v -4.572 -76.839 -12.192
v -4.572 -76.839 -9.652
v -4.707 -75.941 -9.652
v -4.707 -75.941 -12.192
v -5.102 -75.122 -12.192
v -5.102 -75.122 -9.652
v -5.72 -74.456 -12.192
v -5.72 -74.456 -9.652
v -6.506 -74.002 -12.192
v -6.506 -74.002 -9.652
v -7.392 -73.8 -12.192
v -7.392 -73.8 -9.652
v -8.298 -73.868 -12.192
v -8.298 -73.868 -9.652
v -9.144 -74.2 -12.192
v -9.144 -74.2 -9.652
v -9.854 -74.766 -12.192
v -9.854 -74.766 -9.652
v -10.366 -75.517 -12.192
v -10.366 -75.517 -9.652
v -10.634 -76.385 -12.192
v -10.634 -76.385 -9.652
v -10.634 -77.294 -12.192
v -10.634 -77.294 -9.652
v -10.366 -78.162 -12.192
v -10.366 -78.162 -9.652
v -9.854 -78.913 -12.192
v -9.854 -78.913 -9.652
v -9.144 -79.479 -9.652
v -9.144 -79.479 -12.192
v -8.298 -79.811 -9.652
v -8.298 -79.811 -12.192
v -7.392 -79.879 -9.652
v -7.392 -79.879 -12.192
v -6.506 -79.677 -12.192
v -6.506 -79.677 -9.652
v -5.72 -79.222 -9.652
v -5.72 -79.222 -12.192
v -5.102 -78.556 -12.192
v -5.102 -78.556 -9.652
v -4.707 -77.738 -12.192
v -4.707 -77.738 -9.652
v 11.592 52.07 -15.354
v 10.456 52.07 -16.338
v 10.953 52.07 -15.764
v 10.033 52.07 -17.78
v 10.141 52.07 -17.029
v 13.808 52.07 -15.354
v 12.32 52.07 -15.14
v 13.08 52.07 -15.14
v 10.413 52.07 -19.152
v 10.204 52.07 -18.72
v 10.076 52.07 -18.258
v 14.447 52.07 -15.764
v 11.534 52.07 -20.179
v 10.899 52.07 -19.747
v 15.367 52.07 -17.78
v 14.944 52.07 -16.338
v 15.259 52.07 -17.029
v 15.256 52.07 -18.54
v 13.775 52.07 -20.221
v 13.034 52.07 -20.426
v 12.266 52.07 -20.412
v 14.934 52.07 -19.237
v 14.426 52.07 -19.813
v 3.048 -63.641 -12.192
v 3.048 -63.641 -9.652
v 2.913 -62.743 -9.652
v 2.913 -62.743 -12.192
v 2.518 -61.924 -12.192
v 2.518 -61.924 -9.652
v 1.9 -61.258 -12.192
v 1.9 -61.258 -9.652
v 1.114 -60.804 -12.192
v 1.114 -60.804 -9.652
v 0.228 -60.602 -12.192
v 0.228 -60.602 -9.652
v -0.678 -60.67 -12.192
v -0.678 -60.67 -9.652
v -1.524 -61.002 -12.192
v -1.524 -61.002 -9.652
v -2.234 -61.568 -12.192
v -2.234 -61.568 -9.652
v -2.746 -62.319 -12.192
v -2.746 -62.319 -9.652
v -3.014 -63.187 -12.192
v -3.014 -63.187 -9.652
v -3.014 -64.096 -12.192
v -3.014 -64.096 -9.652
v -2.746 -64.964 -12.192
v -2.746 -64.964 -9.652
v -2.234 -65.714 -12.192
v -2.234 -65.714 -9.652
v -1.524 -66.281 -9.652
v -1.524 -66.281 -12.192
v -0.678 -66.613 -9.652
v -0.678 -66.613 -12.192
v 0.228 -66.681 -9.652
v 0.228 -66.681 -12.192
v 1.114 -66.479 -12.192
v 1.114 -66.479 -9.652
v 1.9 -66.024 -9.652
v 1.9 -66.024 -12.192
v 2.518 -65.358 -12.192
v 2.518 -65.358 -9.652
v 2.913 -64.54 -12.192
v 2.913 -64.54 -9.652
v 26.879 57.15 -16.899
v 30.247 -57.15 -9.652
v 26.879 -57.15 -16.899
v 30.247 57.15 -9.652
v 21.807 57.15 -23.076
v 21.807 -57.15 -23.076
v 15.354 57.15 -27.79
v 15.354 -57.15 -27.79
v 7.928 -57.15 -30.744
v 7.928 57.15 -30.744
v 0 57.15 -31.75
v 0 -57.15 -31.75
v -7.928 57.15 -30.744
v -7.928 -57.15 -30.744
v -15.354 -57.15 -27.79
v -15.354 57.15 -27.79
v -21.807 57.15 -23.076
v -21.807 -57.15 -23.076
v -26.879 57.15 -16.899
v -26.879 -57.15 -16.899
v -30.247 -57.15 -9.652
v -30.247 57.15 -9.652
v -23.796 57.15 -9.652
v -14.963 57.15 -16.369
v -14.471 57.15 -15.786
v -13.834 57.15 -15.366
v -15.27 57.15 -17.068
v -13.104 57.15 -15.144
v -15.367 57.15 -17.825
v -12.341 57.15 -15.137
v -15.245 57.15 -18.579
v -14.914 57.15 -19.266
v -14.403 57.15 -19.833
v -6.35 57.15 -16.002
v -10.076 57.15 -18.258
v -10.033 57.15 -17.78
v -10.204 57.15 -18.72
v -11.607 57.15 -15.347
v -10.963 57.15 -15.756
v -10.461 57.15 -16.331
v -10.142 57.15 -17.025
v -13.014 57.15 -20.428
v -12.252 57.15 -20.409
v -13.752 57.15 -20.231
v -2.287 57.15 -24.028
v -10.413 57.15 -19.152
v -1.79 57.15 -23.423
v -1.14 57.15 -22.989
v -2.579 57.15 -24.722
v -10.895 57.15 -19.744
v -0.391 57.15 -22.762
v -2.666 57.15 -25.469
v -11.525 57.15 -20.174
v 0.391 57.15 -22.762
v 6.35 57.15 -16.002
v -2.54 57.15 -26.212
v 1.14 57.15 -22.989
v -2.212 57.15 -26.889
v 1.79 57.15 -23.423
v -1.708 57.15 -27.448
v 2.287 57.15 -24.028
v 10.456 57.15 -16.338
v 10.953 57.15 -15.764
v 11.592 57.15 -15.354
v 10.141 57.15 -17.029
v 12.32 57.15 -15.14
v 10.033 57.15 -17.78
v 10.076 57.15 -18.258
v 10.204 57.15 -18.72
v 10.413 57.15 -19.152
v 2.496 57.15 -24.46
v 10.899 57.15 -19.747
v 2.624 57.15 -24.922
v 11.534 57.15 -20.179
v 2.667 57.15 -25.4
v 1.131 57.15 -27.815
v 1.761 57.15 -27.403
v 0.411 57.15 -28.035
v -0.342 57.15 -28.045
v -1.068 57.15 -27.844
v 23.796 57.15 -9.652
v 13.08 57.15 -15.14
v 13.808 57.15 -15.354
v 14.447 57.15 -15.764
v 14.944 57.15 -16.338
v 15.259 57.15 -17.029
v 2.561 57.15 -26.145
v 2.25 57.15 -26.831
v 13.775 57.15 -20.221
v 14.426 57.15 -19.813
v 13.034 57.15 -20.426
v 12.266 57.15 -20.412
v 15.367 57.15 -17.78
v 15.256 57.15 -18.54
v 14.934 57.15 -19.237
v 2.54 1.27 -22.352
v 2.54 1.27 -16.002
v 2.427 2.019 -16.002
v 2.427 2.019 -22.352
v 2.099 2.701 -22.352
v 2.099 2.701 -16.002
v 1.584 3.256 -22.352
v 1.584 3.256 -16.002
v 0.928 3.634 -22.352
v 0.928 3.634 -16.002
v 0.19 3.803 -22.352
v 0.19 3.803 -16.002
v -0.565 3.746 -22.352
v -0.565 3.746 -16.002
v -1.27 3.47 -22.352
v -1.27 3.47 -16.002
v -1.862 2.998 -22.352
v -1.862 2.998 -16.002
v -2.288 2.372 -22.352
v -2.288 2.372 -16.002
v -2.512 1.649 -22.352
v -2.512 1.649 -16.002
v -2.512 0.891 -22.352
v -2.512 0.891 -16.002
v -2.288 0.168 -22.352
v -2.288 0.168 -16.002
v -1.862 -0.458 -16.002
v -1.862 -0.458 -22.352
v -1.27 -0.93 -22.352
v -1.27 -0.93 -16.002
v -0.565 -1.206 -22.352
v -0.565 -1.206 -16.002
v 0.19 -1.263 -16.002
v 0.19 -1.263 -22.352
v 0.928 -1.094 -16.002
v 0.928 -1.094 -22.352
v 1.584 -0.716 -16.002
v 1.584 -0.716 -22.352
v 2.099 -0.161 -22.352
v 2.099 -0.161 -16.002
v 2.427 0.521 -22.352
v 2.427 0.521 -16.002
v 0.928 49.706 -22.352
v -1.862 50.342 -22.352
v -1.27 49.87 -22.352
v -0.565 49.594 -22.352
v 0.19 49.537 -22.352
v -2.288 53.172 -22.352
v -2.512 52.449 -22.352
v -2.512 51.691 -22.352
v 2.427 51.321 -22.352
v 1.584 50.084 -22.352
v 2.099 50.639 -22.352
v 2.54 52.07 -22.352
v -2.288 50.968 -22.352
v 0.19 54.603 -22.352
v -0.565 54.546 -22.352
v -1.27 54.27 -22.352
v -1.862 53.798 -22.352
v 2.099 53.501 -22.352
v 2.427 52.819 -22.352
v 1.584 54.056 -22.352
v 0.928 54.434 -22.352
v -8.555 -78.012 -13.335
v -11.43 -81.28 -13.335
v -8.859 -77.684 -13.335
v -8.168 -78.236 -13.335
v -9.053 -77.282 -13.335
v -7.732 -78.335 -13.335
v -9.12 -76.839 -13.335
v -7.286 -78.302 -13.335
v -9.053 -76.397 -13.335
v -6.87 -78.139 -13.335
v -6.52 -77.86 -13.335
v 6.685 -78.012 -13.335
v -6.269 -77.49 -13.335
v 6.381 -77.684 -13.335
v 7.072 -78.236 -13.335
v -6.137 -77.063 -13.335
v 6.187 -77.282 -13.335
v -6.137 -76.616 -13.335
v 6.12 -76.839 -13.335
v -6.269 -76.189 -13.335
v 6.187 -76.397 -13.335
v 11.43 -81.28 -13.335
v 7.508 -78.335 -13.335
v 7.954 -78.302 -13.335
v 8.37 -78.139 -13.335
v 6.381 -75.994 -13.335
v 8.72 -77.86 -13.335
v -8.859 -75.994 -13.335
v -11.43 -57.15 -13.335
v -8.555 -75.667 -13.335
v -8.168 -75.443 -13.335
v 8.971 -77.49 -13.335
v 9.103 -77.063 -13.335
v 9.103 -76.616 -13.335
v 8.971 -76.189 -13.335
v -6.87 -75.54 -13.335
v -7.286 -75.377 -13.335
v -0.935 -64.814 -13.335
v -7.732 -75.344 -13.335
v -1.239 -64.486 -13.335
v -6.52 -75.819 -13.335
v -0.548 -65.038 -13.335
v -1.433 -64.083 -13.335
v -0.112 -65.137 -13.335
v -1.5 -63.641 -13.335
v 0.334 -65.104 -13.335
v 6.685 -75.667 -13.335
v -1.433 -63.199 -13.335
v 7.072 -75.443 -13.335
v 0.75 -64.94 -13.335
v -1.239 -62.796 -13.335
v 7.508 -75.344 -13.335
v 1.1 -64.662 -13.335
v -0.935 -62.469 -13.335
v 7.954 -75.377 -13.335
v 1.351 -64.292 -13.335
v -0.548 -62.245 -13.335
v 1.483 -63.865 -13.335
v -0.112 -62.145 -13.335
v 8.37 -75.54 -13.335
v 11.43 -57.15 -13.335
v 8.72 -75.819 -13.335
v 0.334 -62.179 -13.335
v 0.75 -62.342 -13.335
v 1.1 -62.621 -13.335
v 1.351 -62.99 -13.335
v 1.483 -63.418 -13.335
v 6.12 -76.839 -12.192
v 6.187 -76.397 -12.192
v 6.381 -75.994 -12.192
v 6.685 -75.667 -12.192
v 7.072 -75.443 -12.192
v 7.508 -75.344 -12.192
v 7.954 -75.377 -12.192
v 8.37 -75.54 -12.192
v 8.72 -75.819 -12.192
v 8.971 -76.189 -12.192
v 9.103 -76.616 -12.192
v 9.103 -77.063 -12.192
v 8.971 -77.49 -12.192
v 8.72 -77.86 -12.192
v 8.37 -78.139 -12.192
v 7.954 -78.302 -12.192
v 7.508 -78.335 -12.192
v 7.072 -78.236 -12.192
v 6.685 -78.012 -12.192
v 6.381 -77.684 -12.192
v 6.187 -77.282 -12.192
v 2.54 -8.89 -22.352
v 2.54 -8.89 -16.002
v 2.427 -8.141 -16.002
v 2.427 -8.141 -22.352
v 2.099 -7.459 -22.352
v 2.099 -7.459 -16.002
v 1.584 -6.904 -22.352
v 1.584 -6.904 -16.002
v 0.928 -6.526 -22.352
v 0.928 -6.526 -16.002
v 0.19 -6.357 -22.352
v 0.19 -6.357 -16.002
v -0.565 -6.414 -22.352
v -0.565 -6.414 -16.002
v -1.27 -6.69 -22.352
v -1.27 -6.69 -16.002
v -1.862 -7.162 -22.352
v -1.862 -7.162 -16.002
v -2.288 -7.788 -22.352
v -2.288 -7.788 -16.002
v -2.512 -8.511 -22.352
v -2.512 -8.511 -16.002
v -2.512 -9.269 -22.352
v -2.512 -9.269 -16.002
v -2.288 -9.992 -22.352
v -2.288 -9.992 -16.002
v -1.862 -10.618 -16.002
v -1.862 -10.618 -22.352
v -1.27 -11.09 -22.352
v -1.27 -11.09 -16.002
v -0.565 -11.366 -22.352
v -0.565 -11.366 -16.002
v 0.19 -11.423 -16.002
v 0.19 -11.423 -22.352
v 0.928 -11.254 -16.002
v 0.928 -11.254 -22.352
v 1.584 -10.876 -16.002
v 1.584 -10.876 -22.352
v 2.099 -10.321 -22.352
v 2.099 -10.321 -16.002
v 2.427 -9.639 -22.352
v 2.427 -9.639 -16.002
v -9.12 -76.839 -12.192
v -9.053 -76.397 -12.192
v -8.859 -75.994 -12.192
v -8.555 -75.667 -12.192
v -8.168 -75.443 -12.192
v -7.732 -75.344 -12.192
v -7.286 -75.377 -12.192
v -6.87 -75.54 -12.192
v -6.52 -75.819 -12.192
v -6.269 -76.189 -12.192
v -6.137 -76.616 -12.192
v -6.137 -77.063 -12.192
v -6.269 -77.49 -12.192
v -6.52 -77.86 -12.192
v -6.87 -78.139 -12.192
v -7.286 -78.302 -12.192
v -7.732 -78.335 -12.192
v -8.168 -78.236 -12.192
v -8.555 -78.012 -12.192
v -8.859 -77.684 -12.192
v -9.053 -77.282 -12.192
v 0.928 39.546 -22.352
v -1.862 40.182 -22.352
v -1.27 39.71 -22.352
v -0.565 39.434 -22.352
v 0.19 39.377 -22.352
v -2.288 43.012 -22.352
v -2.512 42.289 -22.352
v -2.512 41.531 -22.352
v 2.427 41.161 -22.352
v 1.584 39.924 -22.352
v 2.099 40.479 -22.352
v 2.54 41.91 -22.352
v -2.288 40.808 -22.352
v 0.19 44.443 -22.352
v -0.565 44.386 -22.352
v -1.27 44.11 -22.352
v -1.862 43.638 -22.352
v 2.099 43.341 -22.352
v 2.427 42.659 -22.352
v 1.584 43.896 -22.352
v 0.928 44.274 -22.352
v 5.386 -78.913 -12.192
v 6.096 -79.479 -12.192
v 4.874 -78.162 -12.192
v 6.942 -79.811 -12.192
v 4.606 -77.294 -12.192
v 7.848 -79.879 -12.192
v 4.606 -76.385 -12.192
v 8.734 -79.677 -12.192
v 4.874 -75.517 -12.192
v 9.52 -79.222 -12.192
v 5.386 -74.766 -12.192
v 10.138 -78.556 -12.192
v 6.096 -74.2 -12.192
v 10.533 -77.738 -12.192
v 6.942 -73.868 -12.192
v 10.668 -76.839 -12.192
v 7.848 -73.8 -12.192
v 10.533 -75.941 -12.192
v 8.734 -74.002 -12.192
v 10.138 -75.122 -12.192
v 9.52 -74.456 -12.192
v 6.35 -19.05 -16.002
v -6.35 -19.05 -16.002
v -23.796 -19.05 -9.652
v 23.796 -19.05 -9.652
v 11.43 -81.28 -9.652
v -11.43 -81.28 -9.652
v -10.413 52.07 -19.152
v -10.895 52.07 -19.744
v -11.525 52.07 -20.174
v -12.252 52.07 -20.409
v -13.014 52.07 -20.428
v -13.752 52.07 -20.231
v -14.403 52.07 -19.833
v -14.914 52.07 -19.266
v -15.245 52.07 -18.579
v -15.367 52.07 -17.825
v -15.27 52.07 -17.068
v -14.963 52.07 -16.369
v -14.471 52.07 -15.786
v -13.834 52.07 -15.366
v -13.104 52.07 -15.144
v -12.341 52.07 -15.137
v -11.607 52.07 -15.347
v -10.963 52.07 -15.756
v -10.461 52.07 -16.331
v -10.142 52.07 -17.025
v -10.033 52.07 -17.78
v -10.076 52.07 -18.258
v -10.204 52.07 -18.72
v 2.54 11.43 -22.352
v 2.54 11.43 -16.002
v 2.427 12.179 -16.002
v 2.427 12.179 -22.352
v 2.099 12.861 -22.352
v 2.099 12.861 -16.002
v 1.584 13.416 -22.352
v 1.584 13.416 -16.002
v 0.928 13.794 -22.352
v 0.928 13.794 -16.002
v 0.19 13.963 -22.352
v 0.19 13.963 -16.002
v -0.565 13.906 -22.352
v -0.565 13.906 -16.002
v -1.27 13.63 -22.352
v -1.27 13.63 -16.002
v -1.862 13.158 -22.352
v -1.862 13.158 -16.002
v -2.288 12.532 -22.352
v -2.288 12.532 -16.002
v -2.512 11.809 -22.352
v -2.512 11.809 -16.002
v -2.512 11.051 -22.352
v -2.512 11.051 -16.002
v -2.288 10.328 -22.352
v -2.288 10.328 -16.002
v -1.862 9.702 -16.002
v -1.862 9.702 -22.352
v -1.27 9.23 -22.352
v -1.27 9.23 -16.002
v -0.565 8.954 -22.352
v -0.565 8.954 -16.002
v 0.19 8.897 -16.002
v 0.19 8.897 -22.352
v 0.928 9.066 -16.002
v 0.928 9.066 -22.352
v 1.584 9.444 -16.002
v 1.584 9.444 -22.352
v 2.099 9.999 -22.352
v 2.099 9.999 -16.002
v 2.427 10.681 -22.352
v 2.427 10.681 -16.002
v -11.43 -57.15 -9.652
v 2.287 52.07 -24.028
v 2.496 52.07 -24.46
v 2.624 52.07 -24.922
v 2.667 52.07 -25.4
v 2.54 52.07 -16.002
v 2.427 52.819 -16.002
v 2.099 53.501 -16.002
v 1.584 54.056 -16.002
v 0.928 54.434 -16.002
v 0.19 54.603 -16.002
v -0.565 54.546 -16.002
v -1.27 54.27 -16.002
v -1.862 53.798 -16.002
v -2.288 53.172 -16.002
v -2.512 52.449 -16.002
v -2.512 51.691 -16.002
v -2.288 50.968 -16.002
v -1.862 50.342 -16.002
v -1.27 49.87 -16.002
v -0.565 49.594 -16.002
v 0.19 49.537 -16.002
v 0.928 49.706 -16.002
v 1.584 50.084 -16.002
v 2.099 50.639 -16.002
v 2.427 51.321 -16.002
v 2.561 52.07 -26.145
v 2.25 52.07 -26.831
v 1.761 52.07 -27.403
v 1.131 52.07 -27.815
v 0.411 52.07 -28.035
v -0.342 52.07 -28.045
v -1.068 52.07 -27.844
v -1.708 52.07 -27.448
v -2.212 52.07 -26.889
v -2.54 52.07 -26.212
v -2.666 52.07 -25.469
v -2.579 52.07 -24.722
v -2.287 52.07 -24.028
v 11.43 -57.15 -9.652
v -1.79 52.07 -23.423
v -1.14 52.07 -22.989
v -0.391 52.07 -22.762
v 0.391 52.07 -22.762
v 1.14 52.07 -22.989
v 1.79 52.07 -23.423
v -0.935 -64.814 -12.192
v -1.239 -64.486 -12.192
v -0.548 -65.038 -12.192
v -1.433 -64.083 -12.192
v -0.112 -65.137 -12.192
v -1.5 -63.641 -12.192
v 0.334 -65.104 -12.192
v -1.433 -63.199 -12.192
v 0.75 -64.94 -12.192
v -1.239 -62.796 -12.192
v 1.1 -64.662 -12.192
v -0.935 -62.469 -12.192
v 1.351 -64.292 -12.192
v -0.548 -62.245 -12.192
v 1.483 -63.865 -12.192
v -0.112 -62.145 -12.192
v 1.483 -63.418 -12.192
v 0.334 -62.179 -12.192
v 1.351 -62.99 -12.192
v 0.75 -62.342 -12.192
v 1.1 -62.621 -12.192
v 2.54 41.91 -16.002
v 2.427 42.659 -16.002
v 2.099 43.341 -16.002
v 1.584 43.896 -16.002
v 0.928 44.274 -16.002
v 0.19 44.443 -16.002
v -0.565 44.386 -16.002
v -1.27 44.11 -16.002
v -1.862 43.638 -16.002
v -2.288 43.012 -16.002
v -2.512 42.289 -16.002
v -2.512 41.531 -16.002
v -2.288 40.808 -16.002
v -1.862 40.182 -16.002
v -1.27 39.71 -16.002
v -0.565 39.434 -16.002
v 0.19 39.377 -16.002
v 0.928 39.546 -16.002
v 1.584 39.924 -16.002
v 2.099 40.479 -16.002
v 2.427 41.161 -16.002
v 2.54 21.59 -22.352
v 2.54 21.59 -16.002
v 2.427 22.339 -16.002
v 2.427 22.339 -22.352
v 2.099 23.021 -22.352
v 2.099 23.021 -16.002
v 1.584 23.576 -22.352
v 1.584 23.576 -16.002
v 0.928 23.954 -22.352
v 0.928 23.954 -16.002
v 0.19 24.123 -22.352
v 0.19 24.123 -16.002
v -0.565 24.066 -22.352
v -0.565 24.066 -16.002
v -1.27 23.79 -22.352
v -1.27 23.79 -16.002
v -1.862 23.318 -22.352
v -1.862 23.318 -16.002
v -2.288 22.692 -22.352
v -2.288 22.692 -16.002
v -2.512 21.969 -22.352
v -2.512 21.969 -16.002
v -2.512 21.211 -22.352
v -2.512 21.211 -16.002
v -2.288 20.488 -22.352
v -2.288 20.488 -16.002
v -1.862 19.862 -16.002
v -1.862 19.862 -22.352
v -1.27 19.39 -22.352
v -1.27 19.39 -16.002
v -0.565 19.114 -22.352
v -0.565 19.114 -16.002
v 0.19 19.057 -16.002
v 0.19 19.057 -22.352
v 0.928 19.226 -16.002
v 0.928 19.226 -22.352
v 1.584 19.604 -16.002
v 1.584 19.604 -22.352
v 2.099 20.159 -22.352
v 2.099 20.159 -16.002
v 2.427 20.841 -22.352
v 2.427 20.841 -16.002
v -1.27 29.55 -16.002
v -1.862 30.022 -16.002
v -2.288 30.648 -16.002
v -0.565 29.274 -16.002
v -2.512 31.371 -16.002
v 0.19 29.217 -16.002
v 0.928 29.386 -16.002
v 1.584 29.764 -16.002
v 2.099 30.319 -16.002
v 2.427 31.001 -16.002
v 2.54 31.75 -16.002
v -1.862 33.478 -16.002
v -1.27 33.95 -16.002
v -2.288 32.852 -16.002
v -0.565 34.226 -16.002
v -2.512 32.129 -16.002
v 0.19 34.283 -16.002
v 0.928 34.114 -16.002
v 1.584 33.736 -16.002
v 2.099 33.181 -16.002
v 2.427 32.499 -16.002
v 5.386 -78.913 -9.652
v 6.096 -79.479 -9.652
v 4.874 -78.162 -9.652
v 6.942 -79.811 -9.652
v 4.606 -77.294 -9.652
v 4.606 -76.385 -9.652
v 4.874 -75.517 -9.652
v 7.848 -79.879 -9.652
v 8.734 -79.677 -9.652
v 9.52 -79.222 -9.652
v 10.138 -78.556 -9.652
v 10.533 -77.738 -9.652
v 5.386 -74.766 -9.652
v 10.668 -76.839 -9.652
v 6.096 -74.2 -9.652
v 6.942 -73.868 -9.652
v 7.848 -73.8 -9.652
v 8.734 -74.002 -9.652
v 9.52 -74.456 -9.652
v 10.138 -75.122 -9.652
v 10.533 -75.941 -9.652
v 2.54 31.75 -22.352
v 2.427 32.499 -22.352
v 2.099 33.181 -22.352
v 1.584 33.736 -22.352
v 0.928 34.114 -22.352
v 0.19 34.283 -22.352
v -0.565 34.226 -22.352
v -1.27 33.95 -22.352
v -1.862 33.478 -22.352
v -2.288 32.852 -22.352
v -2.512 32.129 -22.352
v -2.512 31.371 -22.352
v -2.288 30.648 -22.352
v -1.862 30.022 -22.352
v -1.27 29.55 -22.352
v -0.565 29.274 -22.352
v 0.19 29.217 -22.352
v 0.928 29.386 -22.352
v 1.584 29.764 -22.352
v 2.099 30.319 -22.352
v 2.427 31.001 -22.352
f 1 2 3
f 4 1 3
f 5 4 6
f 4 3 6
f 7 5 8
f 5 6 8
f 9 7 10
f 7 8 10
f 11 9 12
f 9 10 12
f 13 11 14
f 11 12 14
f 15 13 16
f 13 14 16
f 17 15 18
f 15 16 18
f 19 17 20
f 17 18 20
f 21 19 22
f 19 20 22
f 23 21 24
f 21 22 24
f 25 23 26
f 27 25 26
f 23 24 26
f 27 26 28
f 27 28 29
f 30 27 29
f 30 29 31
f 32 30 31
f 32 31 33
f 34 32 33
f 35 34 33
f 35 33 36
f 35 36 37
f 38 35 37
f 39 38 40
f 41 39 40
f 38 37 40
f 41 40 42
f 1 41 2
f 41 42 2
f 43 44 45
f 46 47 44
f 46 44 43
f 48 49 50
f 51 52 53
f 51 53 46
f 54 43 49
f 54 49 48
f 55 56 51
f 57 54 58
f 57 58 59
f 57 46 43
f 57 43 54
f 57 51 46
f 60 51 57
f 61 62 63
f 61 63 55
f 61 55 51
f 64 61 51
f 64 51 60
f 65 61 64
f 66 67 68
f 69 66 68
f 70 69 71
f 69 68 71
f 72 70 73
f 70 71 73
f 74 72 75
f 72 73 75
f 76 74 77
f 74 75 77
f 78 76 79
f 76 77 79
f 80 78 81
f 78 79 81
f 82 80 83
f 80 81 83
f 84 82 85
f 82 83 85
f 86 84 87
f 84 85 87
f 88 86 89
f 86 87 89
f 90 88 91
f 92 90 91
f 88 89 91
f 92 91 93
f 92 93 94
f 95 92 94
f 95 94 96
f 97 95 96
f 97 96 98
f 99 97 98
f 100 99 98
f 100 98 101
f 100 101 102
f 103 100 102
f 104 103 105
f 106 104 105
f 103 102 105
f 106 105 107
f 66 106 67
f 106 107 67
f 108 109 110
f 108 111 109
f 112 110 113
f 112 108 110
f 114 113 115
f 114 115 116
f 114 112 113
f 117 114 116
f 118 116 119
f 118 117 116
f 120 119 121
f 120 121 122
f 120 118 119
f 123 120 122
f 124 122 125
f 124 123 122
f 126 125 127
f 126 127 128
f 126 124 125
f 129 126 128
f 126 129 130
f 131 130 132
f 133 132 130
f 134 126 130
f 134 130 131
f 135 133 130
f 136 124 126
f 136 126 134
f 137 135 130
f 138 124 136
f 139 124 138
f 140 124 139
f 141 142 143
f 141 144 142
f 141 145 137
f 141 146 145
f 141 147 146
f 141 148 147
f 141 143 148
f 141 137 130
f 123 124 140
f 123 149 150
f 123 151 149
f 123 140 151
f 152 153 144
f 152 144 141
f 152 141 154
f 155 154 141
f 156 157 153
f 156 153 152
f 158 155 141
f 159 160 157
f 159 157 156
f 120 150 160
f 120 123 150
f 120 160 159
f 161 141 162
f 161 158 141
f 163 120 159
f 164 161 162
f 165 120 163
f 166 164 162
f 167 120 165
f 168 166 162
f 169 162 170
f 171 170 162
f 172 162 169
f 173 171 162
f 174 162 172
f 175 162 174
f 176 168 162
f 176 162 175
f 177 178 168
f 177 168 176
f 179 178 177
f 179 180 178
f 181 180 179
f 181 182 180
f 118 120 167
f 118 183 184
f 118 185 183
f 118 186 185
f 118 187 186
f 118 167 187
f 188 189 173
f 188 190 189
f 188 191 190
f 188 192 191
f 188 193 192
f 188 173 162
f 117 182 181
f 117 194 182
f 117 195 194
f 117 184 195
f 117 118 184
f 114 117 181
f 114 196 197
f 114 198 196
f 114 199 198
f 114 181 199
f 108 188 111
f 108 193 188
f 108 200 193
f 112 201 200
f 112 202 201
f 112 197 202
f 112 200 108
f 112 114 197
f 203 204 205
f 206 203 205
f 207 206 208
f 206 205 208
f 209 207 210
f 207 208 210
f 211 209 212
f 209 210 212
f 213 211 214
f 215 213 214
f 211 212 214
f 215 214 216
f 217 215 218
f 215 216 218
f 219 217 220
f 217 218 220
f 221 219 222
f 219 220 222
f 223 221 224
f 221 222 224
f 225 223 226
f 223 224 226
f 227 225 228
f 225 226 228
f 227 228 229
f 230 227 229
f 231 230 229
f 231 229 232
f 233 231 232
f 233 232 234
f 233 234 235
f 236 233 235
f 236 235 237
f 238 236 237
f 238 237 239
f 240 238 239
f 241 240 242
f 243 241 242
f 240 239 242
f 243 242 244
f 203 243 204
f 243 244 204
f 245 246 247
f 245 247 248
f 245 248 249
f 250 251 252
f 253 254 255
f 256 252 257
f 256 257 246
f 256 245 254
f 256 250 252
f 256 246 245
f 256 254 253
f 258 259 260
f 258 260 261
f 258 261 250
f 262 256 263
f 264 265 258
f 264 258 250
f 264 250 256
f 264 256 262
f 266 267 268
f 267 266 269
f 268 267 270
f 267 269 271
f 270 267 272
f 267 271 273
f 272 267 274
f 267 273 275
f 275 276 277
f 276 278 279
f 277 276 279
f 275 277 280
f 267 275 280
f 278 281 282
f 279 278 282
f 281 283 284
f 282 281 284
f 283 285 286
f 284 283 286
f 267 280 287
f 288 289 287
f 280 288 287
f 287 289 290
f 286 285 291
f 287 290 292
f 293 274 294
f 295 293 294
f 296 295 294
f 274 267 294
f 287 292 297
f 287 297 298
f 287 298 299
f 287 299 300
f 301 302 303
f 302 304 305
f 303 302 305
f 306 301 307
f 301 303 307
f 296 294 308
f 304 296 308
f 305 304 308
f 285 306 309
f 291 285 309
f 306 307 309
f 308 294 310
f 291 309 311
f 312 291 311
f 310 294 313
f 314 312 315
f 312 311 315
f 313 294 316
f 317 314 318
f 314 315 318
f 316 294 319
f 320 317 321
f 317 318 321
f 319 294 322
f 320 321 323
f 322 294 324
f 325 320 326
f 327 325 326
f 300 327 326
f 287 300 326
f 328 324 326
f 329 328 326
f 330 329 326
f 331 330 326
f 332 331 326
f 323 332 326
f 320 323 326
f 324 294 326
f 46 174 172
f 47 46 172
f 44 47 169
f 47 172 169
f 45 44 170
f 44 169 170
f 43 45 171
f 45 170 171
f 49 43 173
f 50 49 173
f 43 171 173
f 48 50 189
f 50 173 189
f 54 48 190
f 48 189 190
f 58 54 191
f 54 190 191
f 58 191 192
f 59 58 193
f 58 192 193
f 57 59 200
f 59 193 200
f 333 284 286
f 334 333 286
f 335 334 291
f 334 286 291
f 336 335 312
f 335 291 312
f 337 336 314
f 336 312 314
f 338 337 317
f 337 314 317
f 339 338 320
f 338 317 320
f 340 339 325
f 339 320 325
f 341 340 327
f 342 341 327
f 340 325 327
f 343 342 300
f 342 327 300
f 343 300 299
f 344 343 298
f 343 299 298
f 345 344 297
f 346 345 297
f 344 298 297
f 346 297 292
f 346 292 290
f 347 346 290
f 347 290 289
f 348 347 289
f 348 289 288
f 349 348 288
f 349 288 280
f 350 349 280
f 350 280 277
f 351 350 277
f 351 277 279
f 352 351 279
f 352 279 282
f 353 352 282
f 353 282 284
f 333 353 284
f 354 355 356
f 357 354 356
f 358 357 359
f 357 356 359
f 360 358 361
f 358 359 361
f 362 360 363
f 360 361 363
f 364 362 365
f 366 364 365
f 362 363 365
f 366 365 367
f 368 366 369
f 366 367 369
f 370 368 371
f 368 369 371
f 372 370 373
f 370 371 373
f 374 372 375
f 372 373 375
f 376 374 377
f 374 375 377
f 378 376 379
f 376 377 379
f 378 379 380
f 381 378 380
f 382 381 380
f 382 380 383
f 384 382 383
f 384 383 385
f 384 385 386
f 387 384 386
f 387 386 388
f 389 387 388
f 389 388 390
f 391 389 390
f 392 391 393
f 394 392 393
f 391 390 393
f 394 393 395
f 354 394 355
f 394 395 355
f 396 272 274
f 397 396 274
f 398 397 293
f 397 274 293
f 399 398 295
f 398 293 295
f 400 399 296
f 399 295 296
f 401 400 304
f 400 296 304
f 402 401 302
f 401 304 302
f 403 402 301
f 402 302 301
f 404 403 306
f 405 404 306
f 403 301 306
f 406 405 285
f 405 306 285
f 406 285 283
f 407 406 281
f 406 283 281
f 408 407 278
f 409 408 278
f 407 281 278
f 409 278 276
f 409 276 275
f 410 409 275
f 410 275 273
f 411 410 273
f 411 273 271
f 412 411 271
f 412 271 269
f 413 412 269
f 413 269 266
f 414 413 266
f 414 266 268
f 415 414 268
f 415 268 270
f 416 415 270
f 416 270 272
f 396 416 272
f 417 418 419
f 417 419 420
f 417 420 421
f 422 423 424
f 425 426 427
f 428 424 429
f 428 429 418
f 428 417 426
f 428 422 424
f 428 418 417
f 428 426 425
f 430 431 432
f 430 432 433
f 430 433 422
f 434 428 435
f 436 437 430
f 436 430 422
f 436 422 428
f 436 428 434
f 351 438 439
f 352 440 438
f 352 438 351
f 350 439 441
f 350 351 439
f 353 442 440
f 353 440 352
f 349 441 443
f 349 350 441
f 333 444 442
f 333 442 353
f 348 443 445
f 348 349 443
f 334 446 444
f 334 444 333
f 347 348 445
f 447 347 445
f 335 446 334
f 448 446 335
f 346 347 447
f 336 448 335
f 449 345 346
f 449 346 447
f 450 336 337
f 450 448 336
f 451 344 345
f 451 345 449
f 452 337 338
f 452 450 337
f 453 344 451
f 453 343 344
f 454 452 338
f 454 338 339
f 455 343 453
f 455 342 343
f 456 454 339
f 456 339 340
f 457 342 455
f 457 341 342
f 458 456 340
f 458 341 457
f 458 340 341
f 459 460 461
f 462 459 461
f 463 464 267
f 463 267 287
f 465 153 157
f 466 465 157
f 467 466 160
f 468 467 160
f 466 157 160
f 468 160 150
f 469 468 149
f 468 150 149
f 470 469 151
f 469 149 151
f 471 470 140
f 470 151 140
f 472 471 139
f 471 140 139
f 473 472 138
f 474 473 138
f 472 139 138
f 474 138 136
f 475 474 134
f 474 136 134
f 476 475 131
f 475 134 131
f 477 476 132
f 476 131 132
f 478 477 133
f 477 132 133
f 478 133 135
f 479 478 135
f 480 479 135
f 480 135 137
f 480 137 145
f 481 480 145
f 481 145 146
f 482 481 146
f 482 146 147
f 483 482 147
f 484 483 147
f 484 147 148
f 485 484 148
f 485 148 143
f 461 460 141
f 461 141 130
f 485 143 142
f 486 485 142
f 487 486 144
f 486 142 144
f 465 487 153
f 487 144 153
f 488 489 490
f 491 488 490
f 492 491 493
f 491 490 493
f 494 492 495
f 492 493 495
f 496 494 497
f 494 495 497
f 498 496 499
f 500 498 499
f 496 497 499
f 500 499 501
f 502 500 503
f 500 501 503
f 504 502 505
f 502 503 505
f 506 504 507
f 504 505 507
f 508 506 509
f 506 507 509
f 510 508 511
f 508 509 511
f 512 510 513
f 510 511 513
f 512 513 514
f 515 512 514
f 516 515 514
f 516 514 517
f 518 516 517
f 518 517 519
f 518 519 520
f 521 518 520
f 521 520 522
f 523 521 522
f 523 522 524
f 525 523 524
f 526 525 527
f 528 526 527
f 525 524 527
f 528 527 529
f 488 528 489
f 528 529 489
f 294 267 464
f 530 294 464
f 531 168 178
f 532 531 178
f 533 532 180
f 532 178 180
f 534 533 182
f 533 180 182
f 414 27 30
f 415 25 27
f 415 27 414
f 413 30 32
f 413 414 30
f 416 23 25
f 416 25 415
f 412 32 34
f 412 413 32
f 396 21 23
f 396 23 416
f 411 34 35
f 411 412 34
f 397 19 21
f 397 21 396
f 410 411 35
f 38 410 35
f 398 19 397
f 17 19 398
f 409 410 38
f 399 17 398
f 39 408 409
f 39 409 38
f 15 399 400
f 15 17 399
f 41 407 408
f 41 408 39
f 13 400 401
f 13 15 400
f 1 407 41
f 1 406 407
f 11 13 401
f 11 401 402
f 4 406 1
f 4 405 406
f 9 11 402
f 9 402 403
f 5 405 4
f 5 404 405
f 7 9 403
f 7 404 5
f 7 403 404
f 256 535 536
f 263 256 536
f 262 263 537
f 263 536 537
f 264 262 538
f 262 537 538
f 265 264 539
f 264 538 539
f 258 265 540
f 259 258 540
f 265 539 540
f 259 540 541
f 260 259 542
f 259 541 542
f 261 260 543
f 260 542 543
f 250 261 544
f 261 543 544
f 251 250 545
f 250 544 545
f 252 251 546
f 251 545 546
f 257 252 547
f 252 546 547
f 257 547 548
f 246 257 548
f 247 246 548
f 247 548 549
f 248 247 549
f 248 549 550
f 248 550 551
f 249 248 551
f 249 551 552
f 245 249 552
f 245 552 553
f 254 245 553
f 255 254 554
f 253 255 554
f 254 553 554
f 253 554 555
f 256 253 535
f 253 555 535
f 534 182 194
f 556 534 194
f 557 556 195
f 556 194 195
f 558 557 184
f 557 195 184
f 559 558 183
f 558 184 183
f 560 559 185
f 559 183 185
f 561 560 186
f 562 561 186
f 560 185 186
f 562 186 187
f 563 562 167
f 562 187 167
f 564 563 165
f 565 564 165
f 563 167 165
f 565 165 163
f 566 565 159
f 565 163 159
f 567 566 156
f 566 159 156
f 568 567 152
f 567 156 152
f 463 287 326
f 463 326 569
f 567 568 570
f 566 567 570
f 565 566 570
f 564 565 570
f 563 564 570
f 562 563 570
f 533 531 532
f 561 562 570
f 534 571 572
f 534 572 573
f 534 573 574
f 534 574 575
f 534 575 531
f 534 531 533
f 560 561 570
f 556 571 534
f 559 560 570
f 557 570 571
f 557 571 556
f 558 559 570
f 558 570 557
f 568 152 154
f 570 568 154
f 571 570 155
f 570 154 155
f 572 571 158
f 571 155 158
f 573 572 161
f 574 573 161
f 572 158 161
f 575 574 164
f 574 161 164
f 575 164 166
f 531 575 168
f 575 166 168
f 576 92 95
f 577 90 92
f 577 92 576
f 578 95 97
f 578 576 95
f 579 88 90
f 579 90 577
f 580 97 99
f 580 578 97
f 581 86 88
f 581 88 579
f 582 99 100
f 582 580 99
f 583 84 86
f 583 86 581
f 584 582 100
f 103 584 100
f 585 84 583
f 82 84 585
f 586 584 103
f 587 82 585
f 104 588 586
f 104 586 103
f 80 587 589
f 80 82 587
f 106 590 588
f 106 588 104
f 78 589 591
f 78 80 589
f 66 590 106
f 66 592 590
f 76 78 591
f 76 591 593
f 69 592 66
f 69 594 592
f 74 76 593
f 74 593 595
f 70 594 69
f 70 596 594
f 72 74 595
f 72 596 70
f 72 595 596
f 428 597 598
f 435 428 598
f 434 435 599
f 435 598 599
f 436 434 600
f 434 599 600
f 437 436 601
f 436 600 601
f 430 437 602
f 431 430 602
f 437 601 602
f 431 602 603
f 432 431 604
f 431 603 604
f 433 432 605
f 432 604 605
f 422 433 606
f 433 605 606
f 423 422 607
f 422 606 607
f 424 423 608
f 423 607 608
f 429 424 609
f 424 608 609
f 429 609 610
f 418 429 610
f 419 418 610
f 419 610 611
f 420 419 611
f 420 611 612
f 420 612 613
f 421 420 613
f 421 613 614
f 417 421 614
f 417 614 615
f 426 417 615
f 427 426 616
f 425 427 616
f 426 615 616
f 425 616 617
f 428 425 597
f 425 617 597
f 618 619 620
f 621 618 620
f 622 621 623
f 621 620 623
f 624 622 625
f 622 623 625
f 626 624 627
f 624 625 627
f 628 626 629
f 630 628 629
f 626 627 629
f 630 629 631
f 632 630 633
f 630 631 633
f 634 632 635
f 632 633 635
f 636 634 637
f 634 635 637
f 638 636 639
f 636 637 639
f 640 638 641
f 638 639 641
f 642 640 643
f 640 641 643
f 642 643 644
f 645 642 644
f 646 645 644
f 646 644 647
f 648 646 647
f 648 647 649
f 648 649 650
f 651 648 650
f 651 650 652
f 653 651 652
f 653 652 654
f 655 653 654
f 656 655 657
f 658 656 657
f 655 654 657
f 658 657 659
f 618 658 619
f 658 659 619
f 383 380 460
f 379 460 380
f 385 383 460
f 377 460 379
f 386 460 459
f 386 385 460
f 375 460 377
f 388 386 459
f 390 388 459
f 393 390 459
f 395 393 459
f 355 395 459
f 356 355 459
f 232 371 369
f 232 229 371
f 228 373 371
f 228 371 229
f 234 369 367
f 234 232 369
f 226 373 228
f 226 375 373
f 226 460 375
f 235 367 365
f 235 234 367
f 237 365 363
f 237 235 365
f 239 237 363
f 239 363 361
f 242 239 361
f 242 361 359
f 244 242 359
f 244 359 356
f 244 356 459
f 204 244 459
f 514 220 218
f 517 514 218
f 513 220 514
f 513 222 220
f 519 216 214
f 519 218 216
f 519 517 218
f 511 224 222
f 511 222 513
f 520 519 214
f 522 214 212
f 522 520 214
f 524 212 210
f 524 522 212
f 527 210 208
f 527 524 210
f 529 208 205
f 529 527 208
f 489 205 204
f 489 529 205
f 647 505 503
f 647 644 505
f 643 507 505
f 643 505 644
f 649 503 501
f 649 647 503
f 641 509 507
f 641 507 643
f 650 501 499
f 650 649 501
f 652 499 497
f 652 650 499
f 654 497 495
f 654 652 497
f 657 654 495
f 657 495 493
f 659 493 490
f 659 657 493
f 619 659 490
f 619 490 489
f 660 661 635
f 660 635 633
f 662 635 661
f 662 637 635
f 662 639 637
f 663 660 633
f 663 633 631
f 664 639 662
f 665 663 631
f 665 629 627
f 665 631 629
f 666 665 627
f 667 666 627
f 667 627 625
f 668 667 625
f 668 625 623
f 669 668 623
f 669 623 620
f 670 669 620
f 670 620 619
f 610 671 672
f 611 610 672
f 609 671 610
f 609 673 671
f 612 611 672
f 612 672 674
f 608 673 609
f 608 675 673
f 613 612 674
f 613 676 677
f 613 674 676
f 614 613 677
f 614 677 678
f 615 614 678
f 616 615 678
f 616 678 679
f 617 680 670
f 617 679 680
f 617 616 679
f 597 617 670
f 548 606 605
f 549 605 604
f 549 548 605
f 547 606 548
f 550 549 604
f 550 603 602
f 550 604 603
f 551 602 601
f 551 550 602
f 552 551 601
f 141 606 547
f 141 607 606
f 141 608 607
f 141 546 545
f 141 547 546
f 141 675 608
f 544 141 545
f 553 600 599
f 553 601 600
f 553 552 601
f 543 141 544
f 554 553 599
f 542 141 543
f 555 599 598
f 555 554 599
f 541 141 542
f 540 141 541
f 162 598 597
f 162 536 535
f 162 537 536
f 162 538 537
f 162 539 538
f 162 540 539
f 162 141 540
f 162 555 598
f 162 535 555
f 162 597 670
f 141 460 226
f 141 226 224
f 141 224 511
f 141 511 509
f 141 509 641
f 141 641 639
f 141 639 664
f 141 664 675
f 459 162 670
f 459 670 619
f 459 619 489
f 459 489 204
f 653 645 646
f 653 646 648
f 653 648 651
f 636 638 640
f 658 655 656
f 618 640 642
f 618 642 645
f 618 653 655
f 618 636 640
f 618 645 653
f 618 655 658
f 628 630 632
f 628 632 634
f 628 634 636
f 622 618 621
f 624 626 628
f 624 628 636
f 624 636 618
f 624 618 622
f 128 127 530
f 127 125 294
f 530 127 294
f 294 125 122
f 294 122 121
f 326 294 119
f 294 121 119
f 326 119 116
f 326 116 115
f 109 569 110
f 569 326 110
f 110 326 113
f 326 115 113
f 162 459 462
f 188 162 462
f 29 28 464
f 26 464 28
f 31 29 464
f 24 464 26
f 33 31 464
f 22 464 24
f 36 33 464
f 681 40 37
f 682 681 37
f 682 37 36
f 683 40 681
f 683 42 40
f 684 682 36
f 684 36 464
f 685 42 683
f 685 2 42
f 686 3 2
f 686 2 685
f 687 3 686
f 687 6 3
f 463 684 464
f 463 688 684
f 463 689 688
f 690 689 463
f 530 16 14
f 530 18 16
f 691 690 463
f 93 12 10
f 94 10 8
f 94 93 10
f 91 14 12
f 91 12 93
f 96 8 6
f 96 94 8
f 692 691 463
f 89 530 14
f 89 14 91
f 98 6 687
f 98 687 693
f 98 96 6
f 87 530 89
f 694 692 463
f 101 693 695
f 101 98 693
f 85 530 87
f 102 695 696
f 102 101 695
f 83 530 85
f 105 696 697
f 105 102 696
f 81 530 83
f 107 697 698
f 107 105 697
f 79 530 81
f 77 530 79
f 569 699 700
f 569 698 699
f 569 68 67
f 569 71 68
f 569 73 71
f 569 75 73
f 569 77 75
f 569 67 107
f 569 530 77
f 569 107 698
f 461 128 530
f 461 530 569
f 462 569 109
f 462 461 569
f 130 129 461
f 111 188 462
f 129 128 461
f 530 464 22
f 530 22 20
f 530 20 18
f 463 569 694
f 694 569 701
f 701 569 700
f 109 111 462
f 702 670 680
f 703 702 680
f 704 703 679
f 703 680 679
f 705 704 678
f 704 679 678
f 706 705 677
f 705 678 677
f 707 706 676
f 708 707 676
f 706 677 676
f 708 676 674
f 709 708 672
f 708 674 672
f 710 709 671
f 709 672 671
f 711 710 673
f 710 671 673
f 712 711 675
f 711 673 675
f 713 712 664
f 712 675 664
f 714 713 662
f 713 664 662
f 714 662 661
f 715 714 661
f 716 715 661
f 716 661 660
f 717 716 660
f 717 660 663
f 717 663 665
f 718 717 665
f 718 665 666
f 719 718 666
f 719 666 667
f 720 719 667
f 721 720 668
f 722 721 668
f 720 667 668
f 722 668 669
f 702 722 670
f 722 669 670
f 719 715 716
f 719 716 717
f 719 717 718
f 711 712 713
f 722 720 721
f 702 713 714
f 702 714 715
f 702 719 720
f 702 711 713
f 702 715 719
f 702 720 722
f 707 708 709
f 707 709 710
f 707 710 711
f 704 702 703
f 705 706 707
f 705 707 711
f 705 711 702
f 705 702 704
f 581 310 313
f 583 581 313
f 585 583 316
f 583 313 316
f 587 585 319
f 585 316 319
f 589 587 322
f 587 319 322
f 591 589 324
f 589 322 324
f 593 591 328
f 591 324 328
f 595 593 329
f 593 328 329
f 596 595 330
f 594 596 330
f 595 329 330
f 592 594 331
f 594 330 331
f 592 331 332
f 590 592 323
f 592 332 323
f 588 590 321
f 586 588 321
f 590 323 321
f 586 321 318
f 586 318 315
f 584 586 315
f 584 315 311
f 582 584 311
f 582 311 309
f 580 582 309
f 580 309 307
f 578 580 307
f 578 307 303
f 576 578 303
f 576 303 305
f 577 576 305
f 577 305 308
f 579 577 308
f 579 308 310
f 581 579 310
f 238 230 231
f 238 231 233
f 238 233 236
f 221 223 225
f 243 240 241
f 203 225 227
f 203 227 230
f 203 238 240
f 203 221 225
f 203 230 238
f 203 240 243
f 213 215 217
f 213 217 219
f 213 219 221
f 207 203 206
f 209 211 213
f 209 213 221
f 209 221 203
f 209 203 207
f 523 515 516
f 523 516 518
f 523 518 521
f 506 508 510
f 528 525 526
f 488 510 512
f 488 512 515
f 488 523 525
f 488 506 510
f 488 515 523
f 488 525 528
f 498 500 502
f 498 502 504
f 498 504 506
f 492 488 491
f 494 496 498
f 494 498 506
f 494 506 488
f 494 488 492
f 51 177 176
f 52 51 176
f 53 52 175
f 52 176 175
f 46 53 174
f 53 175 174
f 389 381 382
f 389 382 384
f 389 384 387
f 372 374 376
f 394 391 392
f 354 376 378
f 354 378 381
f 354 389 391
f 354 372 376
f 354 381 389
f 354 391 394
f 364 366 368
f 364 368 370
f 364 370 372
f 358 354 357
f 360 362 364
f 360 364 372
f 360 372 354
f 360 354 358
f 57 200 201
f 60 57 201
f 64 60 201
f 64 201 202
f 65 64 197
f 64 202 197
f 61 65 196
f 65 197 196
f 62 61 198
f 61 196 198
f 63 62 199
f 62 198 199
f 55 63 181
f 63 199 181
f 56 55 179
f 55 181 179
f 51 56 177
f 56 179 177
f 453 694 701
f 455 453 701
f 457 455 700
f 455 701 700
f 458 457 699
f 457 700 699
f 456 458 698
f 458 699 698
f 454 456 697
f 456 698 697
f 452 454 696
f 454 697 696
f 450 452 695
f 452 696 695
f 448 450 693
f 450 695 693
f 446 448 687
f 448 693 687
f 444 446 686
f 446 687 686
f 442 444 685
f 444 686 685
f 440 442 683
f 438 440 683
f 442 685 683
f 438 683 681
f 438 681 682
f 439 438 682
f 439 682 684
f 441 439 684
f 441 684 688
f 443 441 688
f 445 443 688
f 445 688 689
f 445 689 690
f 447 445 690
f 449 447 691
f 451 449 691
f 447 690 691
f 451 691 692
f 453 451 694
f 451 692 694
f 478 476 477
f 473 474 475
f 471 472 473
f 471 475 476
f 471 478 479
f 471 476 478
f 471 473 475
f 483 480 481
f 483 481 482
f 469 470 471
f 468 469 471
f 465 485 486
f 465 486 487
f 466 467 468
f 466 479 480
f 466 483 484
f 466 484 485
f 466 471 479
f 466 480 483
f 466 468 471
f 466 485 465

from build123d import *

# Parameters (mm, degrees)
BOSS_EXTRUDE1_DEPTH   = 57.15
SKETCH2_W             = 22.86
SKETCH2_H             = 3.683
BOSS_EXTRUDE2_DEPTH   = 24.13
SKETCH3_R             = 3.048
CUT_EXTRUDE1_DEPTH    = 2.54
F_3_0MM_DOWEL_HOLE1_D = 3
SKETCH6_W             = 12.7
SKETCH6_H             = 76.2
CUT_EXTRUDE2_DEPTH    = 6.35
CUT_EXTRUDE3_DEPTH    = 5.08
SKETCH7_R             = 2.54
CUT_EXTRUDE4_DEPTH    = 6.35
CUT_EXTRUDE5_DEPTH    = 76.2


with BuildPart() as part:
    # Sketch1 → Boss-Extrude1 (new body, symmetric)
    with BuildSketch(Plane(origin=(0, 0, 0), x_dir=(1, 0, 0), z_dir=(0, 1, 0))):
        with BuildLine():
            ThreePointArc((30.247337007, 9.652), (0, 31.75), (-30.247337007, 9.652))
            Line((-30.247337007, 9.652), (30.247337007, 9.652))
        make_face()
    extrude(amount=BOSS_EXTRUDE1_DEPTH, both=True)

    # Sketch2 → Boss-Extrude2 (add)
    with BuildSketch(Plane.XZ.offset(57.15)):
        with Locations((0, -11.4935)):
            Rectangle(SKETCH2_W, SKETCH2_H)
    extrude(amount=BOSS_EXTRUDE2_DEPTH)

    # Sketch3 → Cut-Extrude1 (cut)
    with BuildSketch(Plane.XY.offset(-9.652)):
        with Locations((0, -63.641247378)):
            Circle(SKETCH3_R)
        with Locations((-7.62, -76.839474532)):
            Circle(SKETCH3_R)
        with Locations((7.62, -76.839474532)):
            Circle(SKETCH3_R)
    extrude(amount=-CUT_EXTRUDE1_DEPTH, mode=Mode.SUBTRACT)

    # Ø3.0mm Dowel Hole1 (through all)
    with Locations(Plane.XY.offset(-9.652)):
        with Locations((0, -63.641247378), (7.62, -76.839474532), (-7.62, -76.839474532)):
            Hole(F_3_0MM_DOWEL_HOLE1_D / 2)

    # Sketch6 → Cut-Extrude2 (cut)
    with BuildSketch(Plane.XY.offset(-9.652)):
        with Locations((0, 19.05)):
            Rectangle(SKETCH6_W, SKETCH6_H)
    extrude(amount=-CUT_EXTRUDE2_DEPTH, mode=Mode.SUBTRACT)

    # Sketch8 → Cut-Extrude3 (cut)
    with BuildSketch(Plane(origin=(0, 57.15, 0), x_dir=(1, 0, 0), z_dir=(0, 1, 0))):
        with BuildLine():
            Line((2.286933633, 24.02783982), (0, 25.4))
            Line((0, 25.4), (-2.286933633, 24.02783982))
            ThreePointArc((-2.286933633, 24.02783982), (0, 22.733), (2.286933633, 24.02783982))
        make_face()
        with BuildLine():
            Line((-2.286933633, 24.02783982), (0, 25.4))
            Line((0, 25.4), (2.286933633, 24.02783982))
            ThreePointArc((2.286933633, 24.02783982), (2.570227714, 24.688088137), (2.667, 25.4))
            ThreePointArc((2.667, 25.4), (-0.711911863, 27.970227714), (-2.286933633, 24.02783982))
        make_face()
        with BuildLine():
            ThreePointArc((-10.033, 17.78), (-10.129772286, 18.491911863), (-10.413066367, 19.15216018))
            Line((-10.413066367, 19.15216018), (-12.7, 17.78))
            Line((-12.7, 17.78), (-10.033, 17.78))
        make_face()
        with BuildLine():
            Line((-12.7, 17.78), (-10.413066367, 19.15216018))
            ThreePointArc((-10.413066367, 19.15216018), (-15.270227714, 17.068088137), (-10.033, 17.78))
            Line((-10.033, 17.78), (-12.7, 17.78))
        make_face()
        with BuildLine():
            ThreePointArc((15.367, 17.78), (13.411911863, 20.350227714), (10.413066367, 19.15216018))
            Line((10.413066367, 19.15216018), (12.7, 17.78))
            Line((12.7, 17.78), (10.033, 17.78))
            ThreePointArc((10.033, 17.78), (12.7, 15.113), (15.367, 17.78))
        make_face()
        with BuildLine():
            Line((12.7, 17.78), (10.413066367, 19.15216018))
            ThreePointArc((10.413066367, 19.15216018), (10.129772286, 18.491911863), (10.033, 17.78))
            Line((10.033, 17.78), (12.7, 17.78))
        make_face()
    extrude(amount=-CUT_EXTRUDE3_DEPTH, mode=Mode.SUBTRACT)

    # Sketch7 → Cut-Extrude4 (cut)
    with BuildSketch(Plane.XY.offset(-16.002)):
        with Locations((0, 52.07)):
            Circle(SKETCH7_R)
        with Locations((0, 41.91)):
            Circle(SKETCH7_R)
        with Locations((0, 31.75)):
            Circle(SKETCH7_R)
        with Locations((0, 21.59)):
            Circle(SKETCH7_R)
        with Locations((0, 11.43)):
            Circle(SKETCH7_R)
        with Locations((0, 1.27)):
            Circle(SKETCH7_R)
        with Locations((0, -8.89)):
            Circle(SKETCH7_R)
    extrude(amount=-CUT_EXTRUDE4_DEPTH, mode=Mode.SUBTRACT)

    # Sketch9 → Cut-Extrude5 (cut)
    with BuildSketch(Plane(origin=(0, 57.15, 0), x_dir=(1, 0, 0), z_dir=(0, 1, 0))):
        Polygon((6.35, 16.002), (23.796481614, 9.652), (6.35, 9.652), align=None)
        Polygon((-6.35, 16.002), (-23.796481614, 9.652), (-6.35, 9.652), align=None)
    extrude(amount=-CUT_EXTRUDE5_DEPTH, mode=Mode.SUBTRACT)


solid = part.part
